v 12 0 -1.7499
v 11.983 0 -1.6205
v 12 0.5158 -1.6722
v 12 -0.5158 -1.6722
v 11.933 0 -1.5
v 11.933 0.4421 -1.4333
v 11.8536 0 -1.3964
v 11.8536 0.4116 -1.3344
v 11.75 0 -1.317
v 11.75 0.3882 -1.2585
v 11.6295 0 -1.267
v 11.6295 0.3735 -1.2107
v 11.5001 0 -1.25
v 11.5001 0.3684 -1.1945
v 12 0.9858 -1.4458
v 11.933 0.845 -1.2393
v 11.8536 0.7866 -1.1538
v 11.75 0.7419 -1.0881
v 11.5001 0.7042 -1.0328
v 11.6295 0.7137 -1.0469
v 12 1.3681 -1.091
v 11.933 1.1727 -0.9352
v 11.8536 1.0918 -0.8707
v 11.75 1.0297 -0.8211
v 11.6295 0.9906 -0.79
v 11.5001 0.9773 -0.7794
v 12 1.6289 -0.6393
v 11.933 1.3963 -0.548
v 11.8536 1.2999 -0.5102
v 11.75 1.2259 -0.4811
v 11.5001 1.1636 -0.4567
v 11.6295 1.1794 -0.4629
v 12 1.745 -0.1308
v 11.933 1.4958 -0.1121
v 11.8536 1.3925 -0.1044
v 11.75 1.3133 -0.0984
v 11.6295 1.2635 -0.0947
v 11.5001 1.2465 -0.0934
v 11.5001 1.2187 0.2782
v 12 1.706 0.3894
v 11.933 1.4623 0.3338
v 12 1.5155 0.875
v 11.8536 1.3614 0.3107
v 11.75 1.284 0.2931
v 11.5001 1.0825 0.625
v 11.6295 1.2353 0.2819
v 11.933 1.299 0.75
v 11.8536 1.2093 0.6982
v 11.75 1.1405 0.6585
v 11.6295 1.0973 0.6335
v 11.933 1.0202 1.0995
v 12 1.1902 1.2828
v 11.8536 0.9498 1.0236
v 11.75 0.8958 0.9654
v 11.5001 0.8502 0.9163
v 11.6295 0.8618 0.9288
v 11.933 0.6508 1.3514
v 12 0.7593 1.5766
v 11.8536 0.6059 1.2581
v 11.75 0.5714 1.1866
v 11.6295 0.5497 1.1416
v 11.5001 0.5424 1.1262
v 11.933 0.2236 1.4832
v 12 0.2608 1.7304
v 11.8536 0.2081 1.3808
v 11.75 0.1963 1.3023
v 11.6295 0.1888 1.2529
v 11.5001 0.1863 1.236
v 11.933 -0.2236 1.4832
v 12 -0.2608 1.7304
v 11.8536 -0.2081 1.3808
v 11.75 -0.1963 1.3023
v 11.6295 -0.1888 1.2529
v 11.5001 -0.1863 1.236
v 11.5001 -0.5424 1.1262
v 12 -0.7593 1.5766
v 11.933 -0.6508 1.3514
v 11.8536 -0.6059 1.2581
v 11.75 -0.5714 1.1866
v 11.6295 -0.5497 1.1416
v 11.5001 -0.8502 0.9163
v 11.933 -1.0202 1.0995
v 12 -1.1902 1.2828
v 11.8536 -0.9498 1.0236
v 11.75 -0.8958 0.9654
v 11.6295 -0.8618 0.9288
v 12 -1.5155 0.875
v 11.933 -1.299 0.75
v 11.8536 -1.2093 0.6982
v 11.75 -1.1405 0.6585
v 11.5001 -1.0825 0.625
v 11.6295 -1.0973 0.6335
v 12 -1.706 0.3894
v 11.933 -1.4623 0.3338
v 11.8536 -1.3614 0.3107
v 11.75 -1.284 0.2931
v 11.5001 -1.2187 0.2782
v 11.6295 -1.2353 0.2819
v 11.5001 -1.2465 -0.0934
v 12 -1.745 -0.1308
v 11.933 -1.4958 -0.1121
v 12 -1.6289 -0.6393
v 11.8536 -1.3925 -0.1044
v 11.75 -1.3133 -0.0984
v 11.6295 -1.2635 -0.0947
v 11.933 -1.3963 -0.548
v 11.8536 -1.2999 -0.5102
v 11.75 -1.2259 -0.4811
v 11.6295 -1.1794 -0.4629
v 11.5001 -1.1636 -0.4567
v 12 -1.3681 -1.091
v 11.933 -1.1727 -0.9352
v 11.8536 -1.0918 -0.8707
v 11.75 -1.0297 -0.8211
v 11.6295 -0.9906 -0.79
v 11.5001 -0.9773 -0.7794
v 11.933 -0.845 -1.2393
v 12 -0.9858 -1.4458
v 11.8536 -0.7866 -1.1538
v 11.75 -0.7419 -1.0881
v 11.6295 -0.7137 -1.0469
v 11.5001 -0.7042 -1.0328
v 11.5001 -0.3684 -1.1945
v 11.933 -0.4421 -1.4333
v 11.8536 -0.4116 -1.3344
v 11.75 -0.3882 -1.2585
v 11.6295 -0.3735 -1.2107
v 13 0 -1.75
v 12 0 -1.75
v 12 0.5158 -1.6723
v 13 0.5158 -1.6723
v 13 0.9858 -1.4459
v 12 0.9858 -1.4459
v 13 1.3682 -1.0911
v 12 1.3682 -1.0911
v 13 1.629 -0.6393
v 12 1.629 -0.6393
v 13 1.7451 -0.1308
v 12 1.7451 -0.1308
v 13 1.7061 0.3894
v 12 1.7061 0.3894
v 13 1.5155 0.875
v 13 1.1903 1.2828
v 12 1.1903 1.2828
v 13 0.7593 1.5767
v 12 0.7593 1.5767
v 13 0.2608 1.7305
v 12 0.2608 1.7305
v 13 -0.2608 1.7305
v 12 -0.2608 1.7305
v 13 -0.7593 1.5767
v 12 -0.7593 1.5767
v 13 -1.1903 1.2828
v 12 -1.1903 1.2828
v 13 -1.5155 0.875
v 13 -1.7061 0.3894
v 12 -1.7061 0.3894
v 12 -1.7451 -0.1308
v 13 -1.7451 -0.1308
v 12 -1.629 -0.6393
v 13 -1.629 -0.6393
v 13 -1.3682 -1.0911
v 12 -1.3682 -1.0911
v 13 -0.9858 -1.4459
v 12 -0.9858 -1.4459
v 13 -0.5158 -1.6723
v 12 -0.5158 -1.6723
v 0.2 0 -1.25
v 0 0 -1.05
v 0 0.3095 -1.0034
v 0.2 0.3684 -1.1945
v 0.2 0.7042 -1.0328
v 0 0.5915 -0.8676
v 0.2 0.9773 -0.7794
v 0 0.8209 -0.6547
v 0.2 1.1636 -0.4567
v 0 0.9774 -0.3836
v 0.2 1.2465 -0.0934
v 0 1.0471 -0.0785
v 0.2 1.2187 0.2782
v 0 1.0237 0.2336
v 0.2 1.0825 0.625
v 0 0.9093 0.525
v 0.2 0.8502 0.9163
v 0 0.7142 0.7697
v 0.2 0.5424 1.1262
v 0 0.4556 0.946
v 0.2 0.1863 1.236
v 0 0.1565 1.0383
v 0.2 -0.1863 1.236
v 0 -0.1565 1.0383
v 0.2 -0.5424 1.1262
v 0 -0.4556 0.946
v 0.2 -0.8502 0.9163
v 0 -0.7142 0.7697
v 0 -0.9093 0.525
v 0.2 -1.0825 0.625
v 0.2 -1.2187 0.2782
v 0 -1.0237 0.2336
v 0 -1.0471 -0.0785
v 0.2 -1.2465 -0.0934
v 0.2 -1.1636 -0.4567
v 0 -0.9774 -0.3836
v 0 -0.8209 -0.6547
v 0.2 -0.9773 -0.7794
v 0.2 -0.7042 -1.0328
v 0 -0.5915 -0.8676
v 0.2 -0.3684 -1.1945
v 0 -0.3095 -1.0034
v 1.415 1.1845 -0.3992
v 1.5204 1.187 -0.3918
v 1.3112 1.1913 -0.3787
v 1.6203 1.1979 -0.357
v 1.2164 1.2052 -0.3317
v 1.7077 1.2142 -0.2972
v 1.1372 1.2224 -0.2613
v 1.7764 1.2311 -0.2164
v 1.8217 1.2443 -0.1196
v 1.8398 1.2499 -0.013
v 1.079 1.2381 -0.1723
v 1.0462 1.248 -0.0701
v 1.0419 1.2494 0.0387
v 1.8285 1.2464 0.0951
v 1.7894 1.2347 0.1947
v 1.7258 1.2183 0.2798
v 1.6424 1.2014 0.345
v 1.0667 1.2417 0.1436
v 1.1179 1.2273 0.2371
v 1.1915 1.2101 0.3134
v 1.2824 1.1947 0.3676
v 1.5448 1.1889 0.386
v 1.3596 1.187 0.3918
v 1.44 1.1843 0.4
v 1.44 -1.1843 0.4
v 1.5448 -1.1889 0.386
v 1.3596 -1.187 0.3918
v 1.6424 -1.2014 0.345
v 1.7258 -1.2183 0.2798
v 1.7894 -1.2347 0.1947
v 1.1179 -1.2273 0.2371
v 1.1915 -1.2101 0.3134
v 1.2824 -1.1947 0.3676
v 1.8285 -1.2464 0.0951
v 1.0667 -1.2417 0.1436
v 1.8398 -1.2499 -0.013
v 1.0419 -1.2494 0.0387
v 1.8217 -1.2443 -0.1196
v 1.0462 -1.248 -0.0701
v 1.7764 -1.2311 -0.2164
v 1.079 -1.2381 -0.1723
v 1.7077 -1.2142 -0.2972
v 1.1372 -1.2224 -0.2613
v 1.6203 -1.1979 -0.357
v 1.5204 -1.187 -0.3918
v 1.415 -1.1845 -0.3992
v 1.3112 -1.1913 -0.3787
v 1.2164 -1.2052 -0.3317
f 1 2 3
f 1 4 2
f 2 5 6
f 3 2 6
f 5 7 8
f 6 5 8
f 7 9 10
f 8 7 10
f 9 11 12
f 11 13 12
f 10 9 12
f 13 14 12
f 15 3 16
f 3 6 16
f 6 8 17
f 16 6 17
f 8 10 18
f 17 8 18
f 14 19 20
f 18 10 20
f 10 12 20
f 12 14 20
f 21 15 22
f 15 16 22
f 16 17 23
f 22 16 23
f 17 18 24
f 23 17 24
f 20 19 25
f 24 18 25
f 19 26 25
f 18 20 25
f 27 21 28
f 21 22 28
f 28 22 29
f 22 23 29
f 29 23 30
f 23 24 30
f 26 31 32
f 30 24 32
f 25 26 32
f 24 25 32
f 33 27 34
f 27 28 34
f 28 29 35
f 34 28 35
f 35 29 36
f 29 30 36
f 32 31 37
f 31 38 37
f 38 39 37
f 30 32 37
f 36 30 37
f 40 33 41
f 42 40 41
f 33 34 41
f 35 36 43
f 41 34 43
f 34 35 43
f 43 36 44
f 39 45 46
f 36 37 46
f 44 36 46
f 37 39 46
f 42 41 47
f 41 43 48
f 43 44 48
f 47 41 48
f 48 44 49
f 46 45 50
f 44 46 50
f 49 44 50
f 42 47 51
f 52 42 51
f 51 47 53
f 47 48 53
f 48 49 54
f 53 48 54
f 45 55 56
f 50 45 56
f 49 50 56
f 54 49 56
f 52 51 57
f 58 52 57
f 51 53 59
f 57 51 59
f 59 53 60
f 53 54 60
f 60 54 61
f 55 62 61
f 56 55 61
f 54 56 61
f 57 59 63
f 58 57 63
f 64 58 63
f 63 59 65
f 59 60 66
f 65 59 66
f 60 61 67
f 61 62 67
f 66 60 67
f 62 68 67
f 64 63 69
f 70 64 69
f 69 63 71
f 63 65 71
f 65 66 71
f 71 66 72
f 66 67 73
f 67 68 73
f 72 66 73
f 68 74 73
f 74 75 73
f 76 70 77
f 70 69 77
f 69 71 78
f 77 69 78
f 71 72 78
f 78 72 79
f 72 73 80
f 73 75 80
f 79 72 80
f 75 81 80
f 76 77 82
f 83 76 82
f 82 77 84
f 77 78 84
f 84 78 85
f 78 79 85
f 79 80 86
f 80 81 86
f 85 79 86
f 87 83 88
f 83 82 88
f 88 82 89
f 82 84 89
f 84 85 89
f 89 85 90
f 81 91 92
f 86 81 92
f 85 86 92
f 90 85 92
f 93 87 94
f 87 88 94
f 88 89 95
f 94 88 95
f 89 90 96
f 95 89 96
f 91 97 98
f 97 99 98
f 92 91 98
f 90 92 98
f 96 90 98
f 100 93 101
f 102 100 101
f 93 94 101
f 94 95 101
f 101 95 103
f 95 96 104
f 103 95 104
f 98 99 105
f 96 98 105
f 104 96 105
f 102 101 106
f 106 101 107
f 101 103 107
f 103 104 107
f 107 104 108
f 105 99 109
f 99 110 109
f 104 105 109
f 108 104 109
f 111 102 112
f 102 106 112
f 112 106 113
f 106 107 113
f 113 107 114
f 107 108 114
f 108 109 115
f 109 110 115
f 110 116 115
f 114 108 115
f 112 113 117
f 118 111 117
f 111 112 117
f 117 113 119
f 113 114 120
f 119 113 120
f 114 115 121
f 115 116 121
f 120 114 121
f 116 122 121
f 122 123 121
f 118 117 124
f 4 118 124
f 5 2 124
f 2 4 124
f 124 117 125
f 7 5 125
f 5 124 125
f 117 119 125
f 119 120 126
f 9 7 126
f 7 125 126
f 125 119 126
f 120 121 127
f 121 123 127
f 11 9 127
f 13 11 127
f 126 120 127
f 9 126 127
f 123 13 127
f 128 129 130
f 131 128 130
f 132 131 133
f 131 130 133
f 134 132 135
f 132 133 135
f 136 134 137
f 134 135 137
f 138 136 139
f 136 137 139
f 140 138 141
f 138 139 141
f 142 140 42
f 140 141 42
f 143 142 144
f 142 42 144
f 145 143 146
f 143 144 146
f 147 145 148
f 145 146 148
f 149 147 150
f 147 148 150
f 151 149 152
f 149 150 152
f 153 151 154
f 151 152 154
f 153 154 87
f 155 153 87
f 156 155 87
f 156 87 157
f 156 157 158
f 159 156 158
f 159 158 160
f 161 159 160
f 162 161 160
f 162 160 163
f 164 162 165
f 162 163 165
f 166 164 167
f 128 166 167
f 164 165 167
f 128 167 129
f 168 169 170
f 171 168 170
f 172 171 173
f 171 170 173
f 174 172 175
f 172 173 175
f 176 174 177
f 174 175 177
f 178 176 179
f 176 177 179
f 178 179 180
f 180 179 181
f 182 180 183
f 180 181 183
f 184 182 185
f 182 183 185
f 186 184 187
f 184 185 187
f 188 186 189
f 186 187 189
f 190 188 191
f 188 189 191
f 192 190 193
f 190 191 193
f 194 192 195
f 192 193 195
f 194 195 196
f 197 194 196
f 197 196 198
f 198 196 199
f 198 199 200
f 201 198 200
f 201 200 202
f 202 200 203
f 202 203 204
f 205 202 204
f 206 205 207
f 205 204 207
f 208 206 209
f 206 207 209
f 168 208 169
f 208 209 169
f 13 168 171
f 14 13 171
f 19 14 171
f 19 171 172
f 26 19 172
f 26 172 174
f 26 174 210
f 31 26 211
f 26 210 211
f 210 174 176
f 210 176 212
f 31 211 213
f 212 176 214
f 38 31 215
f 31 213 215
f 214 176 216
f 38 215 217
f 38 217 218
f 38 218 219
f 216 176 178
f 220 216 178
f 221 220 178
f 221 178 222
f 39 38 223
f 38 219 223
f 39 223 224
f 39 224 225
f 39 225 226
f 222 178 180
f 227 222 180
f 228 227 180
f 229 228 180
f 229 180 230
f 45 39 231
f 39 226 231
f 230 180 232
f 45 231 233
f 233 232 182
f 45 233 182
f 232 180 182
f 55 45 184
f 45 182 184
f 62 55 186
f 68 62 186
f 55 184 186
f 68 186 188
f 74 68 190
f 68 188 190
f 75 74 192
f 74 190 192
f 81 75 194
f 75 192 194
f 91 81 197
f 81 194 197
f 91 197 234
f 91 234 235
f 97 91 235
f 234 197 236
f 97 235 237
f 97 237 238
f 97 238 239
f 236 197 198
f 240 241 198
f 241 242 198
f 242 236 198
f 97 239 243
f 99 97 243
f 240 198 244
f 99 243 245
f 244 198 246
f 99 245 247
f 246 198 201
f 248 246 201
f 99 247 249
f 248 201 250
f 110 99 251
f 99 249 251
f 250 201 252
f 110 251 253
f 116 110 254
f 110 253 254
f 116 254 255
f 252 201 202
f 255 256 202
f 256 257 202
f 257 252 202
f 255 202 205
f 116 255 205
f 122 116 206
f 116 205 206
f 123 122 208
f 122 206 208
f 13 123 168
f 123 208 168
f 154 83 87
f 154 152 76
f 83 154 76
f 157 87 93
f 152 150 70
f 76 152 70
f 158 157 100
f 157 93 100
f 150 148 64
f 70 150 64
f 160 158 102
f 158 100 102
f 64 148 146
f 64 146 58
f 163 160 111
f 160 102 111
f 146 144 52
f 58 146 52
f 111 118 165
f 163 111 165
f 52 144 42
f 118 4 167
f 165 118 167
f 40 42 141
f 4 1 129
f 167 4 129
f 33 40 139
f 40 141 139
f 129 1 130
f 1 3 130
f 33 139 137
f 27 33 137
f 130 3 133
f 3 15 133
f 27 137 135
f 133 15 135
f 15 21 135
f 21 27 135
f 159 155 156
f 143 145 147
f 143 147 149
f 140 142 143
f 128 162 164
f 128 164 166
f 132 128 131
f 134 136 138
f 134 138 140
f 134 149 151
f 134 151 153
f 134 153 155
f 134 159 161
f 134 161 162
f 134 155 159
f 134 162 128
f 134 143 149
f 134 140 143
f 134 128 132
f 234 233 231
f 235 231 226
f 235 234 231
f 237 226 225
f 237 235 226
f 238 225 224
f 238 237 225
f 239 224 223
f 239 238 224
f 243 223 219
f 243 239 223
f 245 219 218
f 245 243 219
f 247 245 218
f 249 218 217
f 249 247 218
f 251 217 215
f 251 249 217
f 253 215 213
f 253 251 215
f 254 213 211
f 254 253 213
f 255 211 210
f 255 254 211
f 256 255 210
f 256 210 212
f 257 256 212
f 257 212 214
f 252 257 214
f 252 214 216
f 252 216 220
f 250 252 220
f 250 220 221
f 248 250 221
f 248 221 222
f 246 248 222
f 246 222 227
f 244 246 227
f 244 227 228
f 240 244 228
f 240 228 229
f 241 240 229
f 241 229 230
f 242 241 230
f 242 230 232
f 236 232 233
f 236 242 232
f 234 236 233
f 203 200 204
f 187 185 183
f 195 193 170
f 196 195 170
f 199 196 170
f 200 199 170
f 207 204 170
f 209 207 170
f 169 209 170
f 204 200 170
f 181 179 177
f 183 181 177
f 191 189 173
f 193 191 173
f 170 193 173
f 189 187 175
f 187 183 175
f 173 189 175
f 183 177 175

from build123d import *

# Parameters (mm, degrees)
SKETCH1_R               = 1.25
BOSS_EXTRUDE1_DEPTH     = 12
SKETCH2_R               = 1.75
BOSS_EXTRUDE2_DEPTH     = 1
FILLET1_R               = 0.5
CUT_EXTRUDE1_DEPTH      = 14.233480268
CUT_EXTRUDE1_DEPTH_BACK = 14.233480268
SKETCH3_R               = 0.4
CHAMFER1_SIZE           = 0.2


with BuildPart() as part:
    # Sketch1 → Boss-Extrude1 (new body)
    with BuildSketch(Plane(origin=(0, 0, 0), x_dir=(0, 0, -1), z_dir=(1, 0, 0))):
        Circle(SKETCH1_R)
    extrude(amount=BOSS_EXTRUDE1_DEPTH)

    # Sketch2 → Boss-Extrude2 (add)
    with BuildSketch(Plane(origin=(12, 0, 0), x_dir=(0, 0, -1), z_dir=(1, 0, 0))):
        Circle(SKETCH2_R)
    extrude(amount=BOSS_EXTRUDE2_DEPTH)

    # Fillet1
    fillet1_edges = [part.edges().sort_by_distance(p)[0] for p in [
        (12, 0, 1.25),
    ]]
    fillet(fillet1_edges, radius=FILLET1_R - 0.0001)  # a hair under: the kernel refuses the full size

    # Sketch3 → Cut-Extrude1 (cut, two sides: drawn at the far end of the back side and taken through both)
    with BuildSketch(Plane(origin=(0, 0, 0), x_dir=(1, 0, 0), z_dir=(0, 1, 0)).offset(-CUT_EXTRUDE1_DEPTH_BACK)):
        with Locations(Location((1.44, 0, 0), (0, 0, 270))):
            Circle(SKETCH3_R)
    extrude(amount=CUT_EXTRUDE1_DEPTH + CUT_EXTRUDE1_DEPTH_BACK, mode=Mode.SUBTRACT)

    # Chamfer1
    chamfer1_edges = [part.edges().sort_by_distance(p)[0] for p in [
        (0, 0, 1.25),
    ]]
    chamfer(chamfer1_edges, length=CHAMFER1_SIZE)


solid = part.part
